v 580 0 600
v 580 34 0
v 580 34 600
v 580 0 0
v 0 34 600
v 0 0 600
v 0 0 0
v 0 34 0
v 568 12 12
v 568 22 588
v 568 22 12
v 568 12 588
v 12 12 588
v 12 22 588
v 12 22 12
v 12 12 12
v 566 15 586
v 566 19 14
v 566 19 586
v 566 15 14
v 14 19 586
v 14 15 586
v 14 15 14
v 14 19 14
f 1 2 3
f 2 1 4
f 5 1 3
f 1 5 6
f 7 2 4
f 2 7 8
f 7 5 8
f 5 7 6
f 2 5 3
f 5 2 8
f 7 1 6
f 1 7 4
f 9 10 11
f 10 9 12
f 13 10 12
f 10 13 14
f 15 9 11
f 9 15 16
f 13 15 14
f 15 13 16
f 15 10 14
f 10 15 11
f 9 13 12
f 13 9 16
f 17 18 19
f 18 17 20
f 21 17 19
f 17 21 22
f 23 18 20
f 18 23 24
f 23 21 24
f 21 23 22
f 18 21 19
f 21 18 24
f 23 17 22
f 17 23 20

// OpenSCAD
// file: ../params.scad
// Shared millimetre parameters. Keep in lockstep with freecad/params.py.
// Module scale: 150 kg/day wet train. Walls are CPVC sheet, not metal.

$fn = 36;

WALL        = 12;     // CPVC sheet thickness
FLOOR       = 16;     // floor plate (trough sits on this)

// LEACH CSTR 1 — inside liquor box
CSTR_L      = 2000;
CSTR_W      = 1200;
CSTR_H      = 1400;   // liquid + freeboard
FREEBOARD   = 200;

// CSTR 2 weir (same vessel, +X wall)
WEIR_W      = 450;
WEIR_CREST  = CSTR_H - FREEBOARD;   // from inner floor
WEIR_SLOT_H = 80;
WEIR_LIP    = 120;    // external spout projection

// CSTR 3 floor auger — injection-molded PVC / FG
AUGER_D     = 140;    // flight OD
AUGER_SHAFT = 40;
AUGER_PITCH = 110;
AUGER_TROUGH_W = 180;
AUGER_TROUGH_H = 110;
AUGER_OFFSET_Y = 280; // trough centreline from inner -Y wall
AUGER_INCLINE  = 28;  // deg, lifts out of liquor toward +X

// mixer / nozzles (lid)
MIXER_D     = 50;
GAS_D       = 80;     // acid-gas takeoff
DROP_X      = 80;     // inner-X of shred drop slot
DROP_L      = 400;
DROP_W      = 250;
DROP_COAM   = 80;     // raised coaming around the slot

// LEACHATE PUMP / coarse strainer — −X wall, opposite the weir
PUMP_D      = 80;     // DN80
PUMP_Z      = 450;    // centreline above inner floor (submerged)
PUMP_Y      = 900;    // centreline from inner −Y (away from auger)
STRAINER_L  = 180;
STRAINER_W  = 140;
STRAINER_H  = 160;

// mezzanine feed train
MEZZ_H      = 2200;   // platform top above tank outer floor
MEZZ_L      = 1600;   // platform length in −X
MEZZ_THK    = 12;
HOPPER_L    = 700;
HOPPER_W    = 600;
HOPPER_H    = 800;
SHRED_L     = 500;
SHRED_W     = 500;
SHRED_H     = 450;
CONV_W      = 240;
CONV_H      = 120;
CONV_PLATE  = 6;      // trough plate
CONV_FLANGE = 40;
CONV_SPRING_D = 50;
CONV_SPRING_H = 80;
CONV_BOLT   = 10;     // M10 clearance
CONV_LEN    = 1800;   // default standalone length; plant instance is computed
DUST_D      = 150;    // dust-hood outlet to DUST header
AUGER_LIFT_L = 700;

// dewater belts + split (Phase A 4–6)
FDEW_L      = 1800;
FDEW_W      = 450;
FDEW_H      = 80;
FDEW_RISE   = 120;    // solids end higher so liquor runs back to weir
SDEW_L      = 1400;
SDEW_W      = 220;
SDEW_H      = 80;
SPLIT_L     = 600;
SPLIT_W     = 500;
SPLIT_H     = 400;
STUB_L      = 400;
STUB_W      = 300;
STUB_H      = 250;

// EW funnel cell
EW_L        = 600;    // along aisle (overflow direction)
EW_W        = 420;    // anode-cathode depth
EW_H        = 650;    // rectangular body
EW_FUNNEL_H = 220;
EW_VALVE_D  = 50;
EW_VALVE_L  = 60;
EW_MEM_T    = 4;      // CEM
EW_SLOT     = 10;     // membrane cassette slot
EW_PITCH    = 750;    // aisle spacing, centre to centre
AISLE_X0    = 200;
AISLE_Y     = -(EW_W + 2*WALL) - 400;
AISLE_Z     = 400;
BUND_H      = 150;
BUND_PAD    = 250;
SUMP_L      = 400;
SUMP_W      = 400;
SUMP_H      = 300;
VDF_D       = 700;
VDF_L       = 900;
PAIL_W      = 180;
HDR_D       = 80;
HDR_Z       = 1400;
PYRO_D      = 320;
PYRO_L      = 2800;

// Campus envelopes — lockstep with freecad/params.py
FARM_X=12000; FARM_Y=8000; FARM_L=12000; FARM_W=8000; FARM_H=4500;
FAB_X=12000;  FAB_Y=-6000; FAB_L=8000;   FAB_W=6000;  FAB_H=4000;
HAB_X=-8000;  HAB_Y=8000;  HAB_L=8000;   HAB_W=6000;  HAB_H=3200;
CRYO_X=-6000; CRYO_Y=-4000; CRYO_L=4000; CRYO_W=3000; CRYO_H=3000;
MFG_X=2000;   MFG_Y=9000;  MFG_L=6000;   MFG_W=4000;  MFG_H=3500;

LIFE_Z_GREY=900; LIFE_Z_UPW=1100; LIFE_Z_ETCH=1300;
LIFE_Z_O2=2800; LIFE_Z_N2=3000; LIFE_Z_CO2=3200;
LIFE_D_GREY=50; LIFE_D_UPW=40; LIFE_D_ETCH=32;
LIFE_D_GAS=25; LIFE_D_CO2=40;
// main file
// EW CEM cassette + gaskets. Import STL into EW cell later.
include <../params.scad>;

gasket = 3;
frame = 12;
l = EW_L - 20;
h = EW_H - 50;

module cassette() {
    // frame
    difference() {
        cube([l, EW_SLOT + 2*frame, h]);
        translate([frame, frame, frame])
            cube([l - 2*frame, EW_SLOT, h - 2*frame]);
    }
    // CEM (blue in PFD)
    color("steelblue")
    translate([frame + 2, frame + (EW_SLOT - EW_MEM_T)/2, frame + 2])
        cube([l - 2*frame - 4, EW_MEM_T, h - 2*frame - 4]);
    // gaskets
    color("dimgray")
    translate([frame, frame - gasket, frame])
        cube([l - 2*frame, gasket, h - 2*frame]);
    color("dimgray")
    translate([frame, frame + EW_SLOT, frame])
        cube([l - 2*frame, gasket, h - 2*frame]);
}

cassette();
